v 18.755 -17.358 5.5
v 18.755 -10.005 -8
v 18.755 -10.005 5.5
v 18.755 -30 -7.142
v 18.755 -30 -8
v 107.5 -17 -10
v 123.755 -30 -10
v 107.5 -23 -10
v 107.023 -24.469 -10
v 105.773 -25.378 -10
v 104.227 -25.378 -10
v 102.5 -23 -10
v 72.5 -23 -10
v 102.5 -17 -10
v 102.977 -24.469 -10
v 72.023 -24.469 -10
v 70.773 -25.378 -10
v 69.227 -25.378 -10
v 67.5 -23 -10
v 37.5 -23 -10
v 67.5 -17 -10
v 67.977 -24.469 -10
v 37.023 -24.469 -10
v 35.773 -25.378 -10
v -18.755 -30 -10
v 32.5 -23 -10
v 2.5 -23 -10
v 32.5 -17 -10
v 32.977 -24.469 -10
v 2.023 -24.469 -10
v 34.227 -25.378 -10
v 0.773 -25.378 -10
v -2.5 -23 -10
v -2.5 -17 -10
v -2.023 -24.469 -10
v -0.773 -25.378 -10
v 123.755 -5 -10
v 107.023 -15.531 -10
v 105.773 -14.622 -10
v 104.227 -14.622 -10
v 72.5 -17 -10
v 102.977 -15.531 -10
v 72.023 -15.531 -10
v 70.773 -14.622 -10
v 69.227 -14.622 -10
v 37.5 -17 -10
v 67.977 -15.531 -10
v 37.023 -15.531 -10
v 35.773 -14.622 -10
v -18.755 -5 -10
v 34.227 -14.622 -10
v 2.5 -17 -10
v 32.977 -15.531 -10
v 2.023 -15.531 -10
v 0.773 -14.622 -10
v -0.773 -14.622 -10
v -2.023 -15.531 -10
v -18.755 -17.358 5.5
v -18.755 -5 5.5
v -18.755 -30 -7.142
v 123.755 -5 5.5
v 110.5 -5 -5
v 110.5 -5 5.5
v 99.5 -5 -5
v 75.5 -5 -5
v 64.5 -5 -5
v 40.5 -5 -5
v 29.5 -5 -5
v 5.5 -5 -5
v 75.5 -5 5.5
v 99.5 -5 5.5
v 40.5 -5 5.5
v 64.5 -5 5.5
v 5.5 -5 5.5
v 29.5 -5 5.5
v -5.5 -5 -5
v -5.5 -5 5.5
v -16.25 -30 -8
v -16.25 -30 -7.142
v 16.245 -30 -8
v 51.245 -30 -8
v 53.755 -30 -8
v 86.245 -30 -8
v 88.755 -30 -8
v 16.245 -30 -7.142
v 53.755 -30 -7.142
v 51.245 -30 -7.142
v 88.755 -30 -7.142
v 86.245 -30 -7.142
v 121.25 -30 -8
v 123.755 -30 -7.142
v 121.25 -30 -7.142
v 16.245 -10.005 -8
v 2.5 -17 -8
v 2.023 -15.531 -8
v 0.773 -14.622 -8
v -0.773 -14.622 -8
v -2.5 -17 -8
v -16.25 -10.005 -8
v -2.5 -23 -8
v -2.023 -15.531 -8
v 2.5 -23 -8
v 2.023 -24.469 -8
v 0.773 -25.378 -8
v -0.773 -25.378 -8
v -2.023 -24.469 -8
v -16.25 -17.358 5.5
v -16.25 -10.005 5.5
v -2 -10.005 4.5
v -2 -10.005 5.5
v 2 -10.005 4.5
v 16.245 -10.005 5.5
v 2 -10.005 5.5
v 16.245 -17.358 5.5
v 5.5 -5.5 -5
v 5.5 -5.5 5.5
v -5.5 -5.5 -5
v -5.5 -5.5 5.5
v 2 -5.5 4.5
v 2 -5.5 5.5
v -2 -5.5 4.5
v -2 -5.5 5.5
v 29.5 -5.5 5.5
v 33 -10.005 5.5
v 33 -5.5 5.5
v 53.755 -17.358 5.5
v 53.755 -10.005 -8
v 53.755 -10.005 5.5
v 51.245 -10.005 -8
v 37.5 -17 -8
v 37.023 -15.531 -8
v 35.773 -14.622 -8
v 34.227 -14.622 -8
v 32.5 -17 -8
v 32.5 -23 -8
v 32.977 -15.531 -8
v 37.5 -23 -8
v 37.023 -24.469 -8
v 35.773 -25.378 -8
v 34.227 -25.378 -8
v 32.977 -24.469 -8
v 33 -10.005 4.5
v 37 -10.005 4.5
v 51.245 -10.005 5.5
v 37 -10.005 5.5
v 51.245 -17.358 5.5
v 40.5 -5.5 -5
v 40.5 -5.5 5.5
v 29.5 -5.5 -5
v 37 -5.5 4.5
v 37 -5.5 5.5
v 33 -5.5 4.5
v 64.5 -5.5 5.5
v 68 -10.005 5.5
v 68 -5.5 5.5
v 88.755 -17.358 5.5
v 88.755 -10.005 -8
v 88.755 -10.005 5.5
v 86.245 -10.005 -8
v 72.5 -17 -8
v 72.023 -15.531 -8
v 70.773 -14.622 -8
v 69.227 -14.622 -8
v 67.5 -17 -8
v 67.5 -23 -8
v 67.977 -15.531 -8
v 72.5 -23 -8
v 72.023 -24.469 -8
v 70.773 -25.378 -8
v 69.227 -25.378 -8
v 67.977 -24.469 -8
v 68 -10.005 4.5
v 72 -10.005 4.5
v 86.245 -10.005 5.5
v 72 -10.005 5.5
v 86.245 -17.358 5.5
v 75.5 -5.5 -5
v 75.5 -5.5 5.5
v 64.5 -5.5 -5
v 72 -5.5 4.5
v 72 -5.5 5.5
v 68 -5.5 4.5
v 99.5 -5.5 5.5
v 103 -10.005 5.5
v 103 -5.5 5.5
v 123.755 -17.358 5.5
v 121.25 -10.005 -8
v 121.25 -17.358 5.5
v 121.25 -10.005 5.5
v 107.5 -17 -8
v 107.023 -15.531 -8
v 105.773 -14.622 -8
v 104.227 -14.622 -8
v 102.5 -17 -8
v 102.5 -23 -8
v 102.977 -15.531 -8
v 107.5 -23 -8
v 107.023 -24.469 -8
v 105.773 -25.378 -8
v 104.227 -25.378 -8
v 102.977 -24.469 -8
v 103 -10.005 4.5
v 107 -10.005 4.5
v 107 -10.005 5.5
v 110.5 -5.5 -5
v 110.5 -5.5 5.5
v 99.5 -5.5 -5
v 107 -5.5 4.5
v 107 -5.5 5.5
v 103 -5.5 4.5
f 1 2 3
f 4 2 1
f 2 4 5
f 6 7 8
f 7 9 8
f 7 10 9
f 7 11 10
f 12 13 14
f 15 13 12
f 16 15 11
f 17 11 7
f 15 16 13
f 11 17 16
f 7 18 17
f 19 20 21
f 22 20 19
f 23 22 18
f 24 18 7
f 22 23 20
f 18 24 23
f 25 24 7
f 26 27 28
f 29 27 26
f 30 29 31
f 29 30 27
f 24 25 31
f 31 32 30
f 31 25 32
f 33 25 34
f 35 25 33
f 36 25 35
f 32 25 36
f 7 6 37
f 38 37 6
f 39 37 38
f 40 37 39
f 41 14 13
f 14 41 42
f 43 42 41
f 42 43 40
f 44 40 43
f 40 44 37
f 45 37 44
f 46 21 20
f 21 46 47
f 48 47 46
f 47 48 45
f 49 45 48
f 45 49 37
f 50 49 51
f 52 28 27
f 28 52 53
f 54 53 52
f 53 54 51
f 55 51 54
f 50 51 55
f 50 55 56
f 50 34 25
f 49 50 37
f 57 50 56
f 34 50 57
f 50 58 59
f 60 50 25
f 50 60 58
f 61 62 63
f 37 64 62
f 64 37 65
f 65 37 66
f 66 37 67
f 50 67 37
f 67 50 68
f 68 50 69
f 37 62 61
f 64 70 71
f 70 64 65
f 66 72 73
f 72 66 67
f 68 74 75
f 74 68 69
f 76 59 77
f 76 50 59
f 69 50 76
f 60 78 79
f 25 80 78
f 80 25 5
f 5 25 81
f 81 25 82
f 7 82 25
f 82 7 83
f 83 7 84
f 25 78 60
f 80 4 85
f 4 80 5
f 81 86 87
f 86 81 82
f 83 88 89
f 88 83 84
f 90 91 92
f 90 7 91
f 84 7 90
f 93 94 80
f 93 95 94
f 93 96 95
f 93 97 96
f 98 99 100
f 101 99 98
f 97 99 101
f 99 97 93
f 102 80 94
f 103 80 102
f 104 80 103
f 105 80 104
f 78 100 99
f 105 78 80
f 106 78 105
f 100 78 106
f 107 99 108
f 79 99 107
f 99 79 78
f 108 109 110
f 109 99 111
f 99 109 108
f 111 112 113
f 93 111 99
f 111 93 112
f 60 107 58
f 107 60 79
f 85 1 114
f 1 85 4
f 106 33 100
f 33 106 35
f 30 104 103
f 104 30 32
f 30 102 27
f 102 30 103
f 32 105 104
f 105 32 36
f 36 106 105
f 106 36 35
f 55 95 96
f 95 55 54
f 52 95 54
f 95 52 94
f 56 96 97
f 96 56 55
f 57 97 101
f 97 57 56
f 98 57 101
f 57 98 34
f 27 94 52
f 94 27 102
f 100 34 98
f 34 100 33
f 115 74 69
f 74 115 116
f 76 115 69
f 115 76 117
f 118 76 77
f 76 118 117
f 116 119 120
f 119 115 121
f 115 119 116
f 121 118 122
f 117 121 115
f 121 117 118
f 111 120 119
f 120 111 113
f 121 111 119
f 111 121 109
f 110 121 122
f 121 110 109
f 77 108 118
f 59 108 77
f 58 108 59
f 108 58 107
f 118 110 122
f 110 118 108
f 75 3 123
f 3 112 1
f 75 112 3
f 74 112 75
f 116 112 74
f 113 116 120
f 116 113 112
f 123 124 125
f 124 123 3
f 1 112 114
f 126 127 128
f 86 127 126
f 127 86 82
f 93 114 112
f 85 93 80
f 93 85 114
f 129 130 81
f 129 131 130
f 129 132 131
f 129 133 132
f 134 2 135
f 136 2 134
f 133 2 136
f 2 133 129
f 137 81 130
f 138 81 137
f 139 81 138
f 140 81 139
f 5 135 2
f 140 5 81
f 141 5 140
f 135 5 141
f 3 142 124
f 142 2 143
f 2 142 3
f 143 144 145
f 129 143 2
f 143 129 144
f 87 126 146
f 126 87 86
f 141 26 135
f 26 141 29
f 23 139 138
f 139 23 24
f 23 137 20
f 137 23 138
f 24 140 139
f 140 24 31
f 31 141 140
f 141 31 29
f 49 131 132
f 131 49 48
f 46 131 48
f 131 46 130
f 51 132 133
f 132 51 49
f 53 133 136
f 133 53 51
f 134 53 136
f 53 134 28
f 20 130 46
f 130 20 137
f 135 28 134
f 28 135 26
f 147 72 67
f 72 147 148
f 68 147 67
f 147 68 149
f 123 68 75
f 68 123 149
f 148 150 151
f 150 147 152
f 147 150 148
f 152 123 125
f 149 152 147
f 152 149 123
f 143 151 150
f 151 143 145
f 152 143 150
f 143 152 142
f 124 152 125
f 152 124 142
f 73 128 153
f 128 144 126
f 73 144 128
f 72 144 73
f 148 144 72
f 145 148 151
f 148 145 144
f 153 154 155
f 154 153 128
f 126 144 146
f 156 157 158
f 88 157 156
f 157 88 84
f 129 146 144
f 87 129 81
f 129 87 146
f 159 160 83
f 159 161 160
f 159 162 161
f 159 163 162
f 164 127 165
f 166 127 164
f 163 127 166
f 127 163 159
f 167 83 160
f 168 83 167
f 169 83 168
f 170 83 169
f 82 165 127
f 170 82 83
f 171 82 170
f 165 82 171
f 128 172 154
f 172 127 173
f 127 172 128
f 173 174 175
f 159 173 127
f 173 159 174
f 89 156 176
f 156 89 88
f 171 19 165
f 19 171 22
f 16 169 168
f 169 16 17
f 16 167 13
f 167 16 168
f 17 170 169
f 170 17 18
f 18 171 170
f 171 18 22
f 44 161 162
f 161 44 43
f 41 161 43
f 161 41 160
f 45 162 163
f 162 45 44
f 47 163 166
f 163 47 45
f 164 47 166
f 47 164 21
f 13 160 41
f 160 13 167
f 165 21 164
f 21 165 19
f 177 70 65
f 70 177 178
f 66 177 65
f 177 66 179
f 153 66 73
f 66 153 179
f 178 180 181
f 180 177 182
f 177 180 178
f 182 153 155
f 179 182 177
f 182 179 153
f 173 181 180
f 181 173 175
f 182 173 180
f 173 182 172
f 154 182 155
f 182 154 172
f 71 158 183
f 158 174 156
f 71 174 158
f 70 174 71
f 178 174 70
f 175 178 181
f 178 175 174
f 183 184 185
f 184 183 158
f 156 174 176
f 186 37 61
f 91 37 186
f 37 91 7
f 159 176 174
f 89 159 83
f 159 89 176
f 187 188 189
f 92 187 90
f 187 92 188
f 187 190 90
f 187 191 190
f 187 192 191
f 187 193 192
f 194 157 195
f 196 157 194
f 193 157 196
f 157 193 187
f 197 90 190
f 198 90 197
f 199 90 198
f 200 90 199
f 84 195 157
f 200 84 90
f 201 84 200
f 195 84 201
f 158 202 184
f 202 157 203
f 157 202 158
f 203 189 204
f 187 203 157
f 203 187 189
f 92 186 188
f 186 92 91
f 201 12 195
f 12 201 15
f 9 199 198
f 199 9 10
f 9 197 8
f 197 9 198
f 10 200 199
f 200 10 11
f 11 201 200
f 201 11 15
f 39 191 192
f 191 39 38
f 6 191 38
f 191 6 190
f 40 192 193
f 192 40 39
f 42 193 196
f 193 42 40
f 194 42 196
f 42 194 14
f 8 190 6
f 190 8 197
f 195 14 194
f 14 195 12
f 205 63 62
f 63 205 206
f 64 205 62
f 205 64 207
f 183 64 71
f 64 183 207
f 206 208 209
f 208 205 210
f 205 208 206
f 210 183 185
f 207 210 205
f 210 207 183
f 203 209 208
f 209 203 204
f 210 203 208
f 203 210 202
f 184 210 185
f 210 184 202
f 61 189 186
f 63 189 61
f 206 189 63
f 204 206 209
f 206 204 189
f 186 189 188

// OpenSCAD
// Distance between the cell centers. 35mm allow you to easily grab the cells.
period=35;

// Diameter of the battery
batteryDiameter=18;

// number of holder units
units=4;

// add slides for the battery plate/slide 
plateSlide=false;

// add a hole to use a screw to connect to the battery terminals
screw=false;

/* Hidden */
$fn=10;
module mountingUnit(){
    //translate([0,0,0]) rotate([-90,0,0]) cylinder(h=65.0,d=18);
    translate([0,-5,0]) difference() {
        union(){
            translate([0,-25/2,0]) cube([period+2.51,25,20], center=true);
            
            // plateSlide holder
            if (plateSlide) translate([0,0.99,0]) cube([14.5,2,20], center=true);
        }
        
        translate([0,-30.01/2,2]) cube([period-2.5,20,20], center=true);
        
        if (screw){
        // hex
        translate([0,-3,0]) rotate([-90,0,0]) cylinder(h=4, d=6.35, $fn=6);
        
        // screw hole
        translate([0,-6,0]) rotate([-90,0,0]) cylinder(h=7, d=3.5);
        
        // wire hole
        translate([period/2-4,-6,0]) rotate([-90,0,0]) cylinder(h=7, d=3.5);
               
        // wire opening
        translate([period/4-2,0.5,0]) cube([period/2,3,3.5], center=true);
        }
        
        // 45 deg sides
        translate([0,-22,10]) rotate([45,0,0]) cube([period+7,40,20], center=true);
        
        // mounting slot
        translate([0,-18,-15]) rotate([0,0,0]) cylinder(h=20, d=5);
        translate([0,-12,-15]) rotate([0,0,0]) cylinder(h=20, d=5);
        translate([-2.5,-18,-15]) cube([5,6,10]);
        
        if (plateSlide){
            // plateSlide slide
            translate([0,0.49,4.5-10]) cube([10.5,1,20], center=true);
            
            // plateSlide middle
            translate([0,1.49,0]) cube([7.5,3,25], center=true);
        } else {
            // plateSlide position
            if (!screw) translate([0,0,1]) cube([11,1,12], center=true);
        }
        
        // plateSlide lead
        translate([0,-4,14.5]) cube([4,10,20], center=true);
        
        // reduce height
        translate([-period/2-5,-15,5.5]) cube([period+10,20,20]);

    }
}
for (i=[1:units]){
    translate([(period)*(i-1),0,0])    mountingUnit();
}
